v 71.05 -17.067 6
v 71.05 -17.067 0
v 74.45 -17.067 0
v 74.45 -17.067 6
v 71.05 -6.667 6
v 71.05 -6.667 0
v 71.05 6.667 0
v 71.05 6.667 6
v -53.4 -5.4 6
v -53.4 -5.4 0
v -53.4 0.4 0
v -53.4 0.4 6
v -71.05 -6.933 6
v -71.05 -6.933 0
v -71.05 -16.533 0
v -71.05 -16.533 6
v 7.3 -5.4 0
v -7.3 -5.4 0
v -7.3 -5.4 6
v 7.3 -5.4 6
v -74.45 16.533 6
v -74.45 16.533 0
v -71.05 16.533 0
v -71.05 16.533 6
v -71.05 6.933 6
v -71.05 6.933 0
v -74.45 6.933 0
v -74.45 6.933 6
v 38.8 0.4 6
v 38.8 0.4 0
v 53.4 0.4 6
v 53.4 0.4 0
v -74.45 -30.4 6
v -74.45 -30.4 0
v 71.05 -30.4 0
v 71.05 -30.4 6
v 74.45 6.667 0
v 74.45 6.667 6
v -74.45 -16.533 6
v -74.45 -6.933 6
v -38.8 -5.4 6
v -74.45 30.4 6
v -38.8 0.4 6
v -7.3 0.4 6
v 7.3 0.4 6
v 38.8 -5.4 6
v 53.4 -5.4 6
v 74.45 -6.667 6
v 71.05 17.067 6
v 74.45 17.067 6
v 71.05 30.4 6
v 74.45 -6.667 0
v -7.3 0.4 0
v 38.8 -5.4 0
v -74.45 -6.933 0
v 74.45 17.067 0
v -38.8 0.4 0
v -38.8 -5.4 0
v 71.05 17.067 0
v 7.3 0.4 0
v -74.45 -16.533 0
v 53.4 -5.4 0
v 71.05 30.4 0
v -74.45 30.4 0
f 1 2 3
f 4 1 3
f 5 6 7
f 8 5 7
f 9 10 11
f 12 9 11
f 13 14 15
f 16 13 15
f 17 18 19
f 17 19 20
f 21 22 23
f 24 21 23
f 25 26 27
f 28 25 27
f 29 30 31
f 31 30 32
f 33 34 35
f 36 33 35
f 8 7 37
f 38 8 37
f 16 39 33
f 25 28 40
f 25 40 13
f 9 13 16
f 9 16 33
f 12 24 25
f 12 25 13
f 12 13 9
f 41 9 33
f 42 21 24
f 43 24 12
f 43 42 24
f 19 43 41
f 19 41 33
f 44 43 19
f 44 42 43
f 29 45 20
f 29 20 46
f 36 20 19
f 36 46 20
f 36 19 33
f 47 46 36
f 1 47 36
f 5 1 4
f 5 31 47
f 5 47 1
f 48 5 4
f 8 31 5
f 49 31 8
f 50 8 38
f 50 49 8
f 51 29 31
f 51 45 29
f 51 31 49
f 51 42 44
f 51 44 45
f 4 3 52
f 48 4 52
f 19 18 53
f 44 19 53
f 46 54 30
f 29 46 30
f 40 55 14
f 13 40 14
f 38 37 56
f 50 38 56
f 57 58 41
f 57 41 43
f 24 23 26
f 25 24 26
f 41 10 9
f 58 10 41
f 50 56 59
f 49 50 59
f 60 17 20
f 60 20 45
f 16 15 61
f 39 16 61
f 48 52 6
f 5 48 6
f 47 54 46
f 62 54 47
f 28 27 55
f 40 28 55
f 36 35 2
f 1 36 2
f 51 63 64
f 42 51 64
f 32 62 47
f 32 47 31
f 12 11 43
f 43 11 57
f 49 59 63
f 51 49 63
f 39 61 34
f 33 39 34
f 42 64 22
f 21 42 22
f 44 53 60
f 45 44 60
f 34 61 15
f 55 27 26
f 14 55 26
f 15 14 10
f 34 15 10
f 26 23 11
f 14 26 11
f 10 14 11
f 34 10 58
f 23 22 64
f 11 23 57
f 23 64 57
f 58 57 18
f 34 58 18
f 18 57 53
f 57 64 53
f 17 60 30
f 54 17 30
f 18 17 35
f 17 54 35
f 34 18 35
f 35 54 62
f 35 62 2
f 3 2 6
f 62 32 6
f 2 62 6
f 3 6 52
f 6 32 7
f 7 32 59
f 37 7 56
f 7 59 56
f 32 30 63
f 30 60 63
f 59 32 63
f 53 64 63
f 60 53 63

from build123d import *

# Parameters (mm, degrees)
SKETCH_1_W      = 14.6
SKETCH_1_H      = 5.8
EXTRUDE_1_DEPTH = 6


with BuildPart() as part:
    # Эскиз1 → Бобышка-Вытянуть1 (new body)
    with BuildSketch(Plane.XY):
        Polygon((-71.05, -30.4), (71.05, -30.4), (71.05, -17.066666667), (74.45, -17.066666667), (74.45, -6.666666667), (71.05, -6.666666667), (71.05, 6.666666667), (74.45, 6.666666667), (74.45, 17.066666667), (71.05, 17.066666667), (71.05, 30.4), (-71.05, 30.4), (-74.45, 30.4), (-74.45, 16.533333333), (-71.05, 16.533333333), (-71.05, 6.933333333), (-74.45, 6.933333333), (-74.45, -6.933333333), (-71.05, -6.933333333), (-71.05, -16.533333333), (-74.45, -16.533333333), (-74.45, -30.4), align=None)
        with Locations((0, -2.5)):
            Rectangle(SKETCH_1_W, SKETCH_1_H, mode=Mode.SUBTRACT)
        with Locations((-46.1, -2.5)):
            Rectangle(SKETCH_1_W, SKETCH_1_H, mode=Mode.SUBTRACT)
        with Locations((46.1, -2.5)):
            Rectangle(SKETCH_1_W, SKETCH_1_H, mode=Mode.SUBTRACT)
    extrude(amount=EXTRUDE_1_DEPTH)


solid = part.part
